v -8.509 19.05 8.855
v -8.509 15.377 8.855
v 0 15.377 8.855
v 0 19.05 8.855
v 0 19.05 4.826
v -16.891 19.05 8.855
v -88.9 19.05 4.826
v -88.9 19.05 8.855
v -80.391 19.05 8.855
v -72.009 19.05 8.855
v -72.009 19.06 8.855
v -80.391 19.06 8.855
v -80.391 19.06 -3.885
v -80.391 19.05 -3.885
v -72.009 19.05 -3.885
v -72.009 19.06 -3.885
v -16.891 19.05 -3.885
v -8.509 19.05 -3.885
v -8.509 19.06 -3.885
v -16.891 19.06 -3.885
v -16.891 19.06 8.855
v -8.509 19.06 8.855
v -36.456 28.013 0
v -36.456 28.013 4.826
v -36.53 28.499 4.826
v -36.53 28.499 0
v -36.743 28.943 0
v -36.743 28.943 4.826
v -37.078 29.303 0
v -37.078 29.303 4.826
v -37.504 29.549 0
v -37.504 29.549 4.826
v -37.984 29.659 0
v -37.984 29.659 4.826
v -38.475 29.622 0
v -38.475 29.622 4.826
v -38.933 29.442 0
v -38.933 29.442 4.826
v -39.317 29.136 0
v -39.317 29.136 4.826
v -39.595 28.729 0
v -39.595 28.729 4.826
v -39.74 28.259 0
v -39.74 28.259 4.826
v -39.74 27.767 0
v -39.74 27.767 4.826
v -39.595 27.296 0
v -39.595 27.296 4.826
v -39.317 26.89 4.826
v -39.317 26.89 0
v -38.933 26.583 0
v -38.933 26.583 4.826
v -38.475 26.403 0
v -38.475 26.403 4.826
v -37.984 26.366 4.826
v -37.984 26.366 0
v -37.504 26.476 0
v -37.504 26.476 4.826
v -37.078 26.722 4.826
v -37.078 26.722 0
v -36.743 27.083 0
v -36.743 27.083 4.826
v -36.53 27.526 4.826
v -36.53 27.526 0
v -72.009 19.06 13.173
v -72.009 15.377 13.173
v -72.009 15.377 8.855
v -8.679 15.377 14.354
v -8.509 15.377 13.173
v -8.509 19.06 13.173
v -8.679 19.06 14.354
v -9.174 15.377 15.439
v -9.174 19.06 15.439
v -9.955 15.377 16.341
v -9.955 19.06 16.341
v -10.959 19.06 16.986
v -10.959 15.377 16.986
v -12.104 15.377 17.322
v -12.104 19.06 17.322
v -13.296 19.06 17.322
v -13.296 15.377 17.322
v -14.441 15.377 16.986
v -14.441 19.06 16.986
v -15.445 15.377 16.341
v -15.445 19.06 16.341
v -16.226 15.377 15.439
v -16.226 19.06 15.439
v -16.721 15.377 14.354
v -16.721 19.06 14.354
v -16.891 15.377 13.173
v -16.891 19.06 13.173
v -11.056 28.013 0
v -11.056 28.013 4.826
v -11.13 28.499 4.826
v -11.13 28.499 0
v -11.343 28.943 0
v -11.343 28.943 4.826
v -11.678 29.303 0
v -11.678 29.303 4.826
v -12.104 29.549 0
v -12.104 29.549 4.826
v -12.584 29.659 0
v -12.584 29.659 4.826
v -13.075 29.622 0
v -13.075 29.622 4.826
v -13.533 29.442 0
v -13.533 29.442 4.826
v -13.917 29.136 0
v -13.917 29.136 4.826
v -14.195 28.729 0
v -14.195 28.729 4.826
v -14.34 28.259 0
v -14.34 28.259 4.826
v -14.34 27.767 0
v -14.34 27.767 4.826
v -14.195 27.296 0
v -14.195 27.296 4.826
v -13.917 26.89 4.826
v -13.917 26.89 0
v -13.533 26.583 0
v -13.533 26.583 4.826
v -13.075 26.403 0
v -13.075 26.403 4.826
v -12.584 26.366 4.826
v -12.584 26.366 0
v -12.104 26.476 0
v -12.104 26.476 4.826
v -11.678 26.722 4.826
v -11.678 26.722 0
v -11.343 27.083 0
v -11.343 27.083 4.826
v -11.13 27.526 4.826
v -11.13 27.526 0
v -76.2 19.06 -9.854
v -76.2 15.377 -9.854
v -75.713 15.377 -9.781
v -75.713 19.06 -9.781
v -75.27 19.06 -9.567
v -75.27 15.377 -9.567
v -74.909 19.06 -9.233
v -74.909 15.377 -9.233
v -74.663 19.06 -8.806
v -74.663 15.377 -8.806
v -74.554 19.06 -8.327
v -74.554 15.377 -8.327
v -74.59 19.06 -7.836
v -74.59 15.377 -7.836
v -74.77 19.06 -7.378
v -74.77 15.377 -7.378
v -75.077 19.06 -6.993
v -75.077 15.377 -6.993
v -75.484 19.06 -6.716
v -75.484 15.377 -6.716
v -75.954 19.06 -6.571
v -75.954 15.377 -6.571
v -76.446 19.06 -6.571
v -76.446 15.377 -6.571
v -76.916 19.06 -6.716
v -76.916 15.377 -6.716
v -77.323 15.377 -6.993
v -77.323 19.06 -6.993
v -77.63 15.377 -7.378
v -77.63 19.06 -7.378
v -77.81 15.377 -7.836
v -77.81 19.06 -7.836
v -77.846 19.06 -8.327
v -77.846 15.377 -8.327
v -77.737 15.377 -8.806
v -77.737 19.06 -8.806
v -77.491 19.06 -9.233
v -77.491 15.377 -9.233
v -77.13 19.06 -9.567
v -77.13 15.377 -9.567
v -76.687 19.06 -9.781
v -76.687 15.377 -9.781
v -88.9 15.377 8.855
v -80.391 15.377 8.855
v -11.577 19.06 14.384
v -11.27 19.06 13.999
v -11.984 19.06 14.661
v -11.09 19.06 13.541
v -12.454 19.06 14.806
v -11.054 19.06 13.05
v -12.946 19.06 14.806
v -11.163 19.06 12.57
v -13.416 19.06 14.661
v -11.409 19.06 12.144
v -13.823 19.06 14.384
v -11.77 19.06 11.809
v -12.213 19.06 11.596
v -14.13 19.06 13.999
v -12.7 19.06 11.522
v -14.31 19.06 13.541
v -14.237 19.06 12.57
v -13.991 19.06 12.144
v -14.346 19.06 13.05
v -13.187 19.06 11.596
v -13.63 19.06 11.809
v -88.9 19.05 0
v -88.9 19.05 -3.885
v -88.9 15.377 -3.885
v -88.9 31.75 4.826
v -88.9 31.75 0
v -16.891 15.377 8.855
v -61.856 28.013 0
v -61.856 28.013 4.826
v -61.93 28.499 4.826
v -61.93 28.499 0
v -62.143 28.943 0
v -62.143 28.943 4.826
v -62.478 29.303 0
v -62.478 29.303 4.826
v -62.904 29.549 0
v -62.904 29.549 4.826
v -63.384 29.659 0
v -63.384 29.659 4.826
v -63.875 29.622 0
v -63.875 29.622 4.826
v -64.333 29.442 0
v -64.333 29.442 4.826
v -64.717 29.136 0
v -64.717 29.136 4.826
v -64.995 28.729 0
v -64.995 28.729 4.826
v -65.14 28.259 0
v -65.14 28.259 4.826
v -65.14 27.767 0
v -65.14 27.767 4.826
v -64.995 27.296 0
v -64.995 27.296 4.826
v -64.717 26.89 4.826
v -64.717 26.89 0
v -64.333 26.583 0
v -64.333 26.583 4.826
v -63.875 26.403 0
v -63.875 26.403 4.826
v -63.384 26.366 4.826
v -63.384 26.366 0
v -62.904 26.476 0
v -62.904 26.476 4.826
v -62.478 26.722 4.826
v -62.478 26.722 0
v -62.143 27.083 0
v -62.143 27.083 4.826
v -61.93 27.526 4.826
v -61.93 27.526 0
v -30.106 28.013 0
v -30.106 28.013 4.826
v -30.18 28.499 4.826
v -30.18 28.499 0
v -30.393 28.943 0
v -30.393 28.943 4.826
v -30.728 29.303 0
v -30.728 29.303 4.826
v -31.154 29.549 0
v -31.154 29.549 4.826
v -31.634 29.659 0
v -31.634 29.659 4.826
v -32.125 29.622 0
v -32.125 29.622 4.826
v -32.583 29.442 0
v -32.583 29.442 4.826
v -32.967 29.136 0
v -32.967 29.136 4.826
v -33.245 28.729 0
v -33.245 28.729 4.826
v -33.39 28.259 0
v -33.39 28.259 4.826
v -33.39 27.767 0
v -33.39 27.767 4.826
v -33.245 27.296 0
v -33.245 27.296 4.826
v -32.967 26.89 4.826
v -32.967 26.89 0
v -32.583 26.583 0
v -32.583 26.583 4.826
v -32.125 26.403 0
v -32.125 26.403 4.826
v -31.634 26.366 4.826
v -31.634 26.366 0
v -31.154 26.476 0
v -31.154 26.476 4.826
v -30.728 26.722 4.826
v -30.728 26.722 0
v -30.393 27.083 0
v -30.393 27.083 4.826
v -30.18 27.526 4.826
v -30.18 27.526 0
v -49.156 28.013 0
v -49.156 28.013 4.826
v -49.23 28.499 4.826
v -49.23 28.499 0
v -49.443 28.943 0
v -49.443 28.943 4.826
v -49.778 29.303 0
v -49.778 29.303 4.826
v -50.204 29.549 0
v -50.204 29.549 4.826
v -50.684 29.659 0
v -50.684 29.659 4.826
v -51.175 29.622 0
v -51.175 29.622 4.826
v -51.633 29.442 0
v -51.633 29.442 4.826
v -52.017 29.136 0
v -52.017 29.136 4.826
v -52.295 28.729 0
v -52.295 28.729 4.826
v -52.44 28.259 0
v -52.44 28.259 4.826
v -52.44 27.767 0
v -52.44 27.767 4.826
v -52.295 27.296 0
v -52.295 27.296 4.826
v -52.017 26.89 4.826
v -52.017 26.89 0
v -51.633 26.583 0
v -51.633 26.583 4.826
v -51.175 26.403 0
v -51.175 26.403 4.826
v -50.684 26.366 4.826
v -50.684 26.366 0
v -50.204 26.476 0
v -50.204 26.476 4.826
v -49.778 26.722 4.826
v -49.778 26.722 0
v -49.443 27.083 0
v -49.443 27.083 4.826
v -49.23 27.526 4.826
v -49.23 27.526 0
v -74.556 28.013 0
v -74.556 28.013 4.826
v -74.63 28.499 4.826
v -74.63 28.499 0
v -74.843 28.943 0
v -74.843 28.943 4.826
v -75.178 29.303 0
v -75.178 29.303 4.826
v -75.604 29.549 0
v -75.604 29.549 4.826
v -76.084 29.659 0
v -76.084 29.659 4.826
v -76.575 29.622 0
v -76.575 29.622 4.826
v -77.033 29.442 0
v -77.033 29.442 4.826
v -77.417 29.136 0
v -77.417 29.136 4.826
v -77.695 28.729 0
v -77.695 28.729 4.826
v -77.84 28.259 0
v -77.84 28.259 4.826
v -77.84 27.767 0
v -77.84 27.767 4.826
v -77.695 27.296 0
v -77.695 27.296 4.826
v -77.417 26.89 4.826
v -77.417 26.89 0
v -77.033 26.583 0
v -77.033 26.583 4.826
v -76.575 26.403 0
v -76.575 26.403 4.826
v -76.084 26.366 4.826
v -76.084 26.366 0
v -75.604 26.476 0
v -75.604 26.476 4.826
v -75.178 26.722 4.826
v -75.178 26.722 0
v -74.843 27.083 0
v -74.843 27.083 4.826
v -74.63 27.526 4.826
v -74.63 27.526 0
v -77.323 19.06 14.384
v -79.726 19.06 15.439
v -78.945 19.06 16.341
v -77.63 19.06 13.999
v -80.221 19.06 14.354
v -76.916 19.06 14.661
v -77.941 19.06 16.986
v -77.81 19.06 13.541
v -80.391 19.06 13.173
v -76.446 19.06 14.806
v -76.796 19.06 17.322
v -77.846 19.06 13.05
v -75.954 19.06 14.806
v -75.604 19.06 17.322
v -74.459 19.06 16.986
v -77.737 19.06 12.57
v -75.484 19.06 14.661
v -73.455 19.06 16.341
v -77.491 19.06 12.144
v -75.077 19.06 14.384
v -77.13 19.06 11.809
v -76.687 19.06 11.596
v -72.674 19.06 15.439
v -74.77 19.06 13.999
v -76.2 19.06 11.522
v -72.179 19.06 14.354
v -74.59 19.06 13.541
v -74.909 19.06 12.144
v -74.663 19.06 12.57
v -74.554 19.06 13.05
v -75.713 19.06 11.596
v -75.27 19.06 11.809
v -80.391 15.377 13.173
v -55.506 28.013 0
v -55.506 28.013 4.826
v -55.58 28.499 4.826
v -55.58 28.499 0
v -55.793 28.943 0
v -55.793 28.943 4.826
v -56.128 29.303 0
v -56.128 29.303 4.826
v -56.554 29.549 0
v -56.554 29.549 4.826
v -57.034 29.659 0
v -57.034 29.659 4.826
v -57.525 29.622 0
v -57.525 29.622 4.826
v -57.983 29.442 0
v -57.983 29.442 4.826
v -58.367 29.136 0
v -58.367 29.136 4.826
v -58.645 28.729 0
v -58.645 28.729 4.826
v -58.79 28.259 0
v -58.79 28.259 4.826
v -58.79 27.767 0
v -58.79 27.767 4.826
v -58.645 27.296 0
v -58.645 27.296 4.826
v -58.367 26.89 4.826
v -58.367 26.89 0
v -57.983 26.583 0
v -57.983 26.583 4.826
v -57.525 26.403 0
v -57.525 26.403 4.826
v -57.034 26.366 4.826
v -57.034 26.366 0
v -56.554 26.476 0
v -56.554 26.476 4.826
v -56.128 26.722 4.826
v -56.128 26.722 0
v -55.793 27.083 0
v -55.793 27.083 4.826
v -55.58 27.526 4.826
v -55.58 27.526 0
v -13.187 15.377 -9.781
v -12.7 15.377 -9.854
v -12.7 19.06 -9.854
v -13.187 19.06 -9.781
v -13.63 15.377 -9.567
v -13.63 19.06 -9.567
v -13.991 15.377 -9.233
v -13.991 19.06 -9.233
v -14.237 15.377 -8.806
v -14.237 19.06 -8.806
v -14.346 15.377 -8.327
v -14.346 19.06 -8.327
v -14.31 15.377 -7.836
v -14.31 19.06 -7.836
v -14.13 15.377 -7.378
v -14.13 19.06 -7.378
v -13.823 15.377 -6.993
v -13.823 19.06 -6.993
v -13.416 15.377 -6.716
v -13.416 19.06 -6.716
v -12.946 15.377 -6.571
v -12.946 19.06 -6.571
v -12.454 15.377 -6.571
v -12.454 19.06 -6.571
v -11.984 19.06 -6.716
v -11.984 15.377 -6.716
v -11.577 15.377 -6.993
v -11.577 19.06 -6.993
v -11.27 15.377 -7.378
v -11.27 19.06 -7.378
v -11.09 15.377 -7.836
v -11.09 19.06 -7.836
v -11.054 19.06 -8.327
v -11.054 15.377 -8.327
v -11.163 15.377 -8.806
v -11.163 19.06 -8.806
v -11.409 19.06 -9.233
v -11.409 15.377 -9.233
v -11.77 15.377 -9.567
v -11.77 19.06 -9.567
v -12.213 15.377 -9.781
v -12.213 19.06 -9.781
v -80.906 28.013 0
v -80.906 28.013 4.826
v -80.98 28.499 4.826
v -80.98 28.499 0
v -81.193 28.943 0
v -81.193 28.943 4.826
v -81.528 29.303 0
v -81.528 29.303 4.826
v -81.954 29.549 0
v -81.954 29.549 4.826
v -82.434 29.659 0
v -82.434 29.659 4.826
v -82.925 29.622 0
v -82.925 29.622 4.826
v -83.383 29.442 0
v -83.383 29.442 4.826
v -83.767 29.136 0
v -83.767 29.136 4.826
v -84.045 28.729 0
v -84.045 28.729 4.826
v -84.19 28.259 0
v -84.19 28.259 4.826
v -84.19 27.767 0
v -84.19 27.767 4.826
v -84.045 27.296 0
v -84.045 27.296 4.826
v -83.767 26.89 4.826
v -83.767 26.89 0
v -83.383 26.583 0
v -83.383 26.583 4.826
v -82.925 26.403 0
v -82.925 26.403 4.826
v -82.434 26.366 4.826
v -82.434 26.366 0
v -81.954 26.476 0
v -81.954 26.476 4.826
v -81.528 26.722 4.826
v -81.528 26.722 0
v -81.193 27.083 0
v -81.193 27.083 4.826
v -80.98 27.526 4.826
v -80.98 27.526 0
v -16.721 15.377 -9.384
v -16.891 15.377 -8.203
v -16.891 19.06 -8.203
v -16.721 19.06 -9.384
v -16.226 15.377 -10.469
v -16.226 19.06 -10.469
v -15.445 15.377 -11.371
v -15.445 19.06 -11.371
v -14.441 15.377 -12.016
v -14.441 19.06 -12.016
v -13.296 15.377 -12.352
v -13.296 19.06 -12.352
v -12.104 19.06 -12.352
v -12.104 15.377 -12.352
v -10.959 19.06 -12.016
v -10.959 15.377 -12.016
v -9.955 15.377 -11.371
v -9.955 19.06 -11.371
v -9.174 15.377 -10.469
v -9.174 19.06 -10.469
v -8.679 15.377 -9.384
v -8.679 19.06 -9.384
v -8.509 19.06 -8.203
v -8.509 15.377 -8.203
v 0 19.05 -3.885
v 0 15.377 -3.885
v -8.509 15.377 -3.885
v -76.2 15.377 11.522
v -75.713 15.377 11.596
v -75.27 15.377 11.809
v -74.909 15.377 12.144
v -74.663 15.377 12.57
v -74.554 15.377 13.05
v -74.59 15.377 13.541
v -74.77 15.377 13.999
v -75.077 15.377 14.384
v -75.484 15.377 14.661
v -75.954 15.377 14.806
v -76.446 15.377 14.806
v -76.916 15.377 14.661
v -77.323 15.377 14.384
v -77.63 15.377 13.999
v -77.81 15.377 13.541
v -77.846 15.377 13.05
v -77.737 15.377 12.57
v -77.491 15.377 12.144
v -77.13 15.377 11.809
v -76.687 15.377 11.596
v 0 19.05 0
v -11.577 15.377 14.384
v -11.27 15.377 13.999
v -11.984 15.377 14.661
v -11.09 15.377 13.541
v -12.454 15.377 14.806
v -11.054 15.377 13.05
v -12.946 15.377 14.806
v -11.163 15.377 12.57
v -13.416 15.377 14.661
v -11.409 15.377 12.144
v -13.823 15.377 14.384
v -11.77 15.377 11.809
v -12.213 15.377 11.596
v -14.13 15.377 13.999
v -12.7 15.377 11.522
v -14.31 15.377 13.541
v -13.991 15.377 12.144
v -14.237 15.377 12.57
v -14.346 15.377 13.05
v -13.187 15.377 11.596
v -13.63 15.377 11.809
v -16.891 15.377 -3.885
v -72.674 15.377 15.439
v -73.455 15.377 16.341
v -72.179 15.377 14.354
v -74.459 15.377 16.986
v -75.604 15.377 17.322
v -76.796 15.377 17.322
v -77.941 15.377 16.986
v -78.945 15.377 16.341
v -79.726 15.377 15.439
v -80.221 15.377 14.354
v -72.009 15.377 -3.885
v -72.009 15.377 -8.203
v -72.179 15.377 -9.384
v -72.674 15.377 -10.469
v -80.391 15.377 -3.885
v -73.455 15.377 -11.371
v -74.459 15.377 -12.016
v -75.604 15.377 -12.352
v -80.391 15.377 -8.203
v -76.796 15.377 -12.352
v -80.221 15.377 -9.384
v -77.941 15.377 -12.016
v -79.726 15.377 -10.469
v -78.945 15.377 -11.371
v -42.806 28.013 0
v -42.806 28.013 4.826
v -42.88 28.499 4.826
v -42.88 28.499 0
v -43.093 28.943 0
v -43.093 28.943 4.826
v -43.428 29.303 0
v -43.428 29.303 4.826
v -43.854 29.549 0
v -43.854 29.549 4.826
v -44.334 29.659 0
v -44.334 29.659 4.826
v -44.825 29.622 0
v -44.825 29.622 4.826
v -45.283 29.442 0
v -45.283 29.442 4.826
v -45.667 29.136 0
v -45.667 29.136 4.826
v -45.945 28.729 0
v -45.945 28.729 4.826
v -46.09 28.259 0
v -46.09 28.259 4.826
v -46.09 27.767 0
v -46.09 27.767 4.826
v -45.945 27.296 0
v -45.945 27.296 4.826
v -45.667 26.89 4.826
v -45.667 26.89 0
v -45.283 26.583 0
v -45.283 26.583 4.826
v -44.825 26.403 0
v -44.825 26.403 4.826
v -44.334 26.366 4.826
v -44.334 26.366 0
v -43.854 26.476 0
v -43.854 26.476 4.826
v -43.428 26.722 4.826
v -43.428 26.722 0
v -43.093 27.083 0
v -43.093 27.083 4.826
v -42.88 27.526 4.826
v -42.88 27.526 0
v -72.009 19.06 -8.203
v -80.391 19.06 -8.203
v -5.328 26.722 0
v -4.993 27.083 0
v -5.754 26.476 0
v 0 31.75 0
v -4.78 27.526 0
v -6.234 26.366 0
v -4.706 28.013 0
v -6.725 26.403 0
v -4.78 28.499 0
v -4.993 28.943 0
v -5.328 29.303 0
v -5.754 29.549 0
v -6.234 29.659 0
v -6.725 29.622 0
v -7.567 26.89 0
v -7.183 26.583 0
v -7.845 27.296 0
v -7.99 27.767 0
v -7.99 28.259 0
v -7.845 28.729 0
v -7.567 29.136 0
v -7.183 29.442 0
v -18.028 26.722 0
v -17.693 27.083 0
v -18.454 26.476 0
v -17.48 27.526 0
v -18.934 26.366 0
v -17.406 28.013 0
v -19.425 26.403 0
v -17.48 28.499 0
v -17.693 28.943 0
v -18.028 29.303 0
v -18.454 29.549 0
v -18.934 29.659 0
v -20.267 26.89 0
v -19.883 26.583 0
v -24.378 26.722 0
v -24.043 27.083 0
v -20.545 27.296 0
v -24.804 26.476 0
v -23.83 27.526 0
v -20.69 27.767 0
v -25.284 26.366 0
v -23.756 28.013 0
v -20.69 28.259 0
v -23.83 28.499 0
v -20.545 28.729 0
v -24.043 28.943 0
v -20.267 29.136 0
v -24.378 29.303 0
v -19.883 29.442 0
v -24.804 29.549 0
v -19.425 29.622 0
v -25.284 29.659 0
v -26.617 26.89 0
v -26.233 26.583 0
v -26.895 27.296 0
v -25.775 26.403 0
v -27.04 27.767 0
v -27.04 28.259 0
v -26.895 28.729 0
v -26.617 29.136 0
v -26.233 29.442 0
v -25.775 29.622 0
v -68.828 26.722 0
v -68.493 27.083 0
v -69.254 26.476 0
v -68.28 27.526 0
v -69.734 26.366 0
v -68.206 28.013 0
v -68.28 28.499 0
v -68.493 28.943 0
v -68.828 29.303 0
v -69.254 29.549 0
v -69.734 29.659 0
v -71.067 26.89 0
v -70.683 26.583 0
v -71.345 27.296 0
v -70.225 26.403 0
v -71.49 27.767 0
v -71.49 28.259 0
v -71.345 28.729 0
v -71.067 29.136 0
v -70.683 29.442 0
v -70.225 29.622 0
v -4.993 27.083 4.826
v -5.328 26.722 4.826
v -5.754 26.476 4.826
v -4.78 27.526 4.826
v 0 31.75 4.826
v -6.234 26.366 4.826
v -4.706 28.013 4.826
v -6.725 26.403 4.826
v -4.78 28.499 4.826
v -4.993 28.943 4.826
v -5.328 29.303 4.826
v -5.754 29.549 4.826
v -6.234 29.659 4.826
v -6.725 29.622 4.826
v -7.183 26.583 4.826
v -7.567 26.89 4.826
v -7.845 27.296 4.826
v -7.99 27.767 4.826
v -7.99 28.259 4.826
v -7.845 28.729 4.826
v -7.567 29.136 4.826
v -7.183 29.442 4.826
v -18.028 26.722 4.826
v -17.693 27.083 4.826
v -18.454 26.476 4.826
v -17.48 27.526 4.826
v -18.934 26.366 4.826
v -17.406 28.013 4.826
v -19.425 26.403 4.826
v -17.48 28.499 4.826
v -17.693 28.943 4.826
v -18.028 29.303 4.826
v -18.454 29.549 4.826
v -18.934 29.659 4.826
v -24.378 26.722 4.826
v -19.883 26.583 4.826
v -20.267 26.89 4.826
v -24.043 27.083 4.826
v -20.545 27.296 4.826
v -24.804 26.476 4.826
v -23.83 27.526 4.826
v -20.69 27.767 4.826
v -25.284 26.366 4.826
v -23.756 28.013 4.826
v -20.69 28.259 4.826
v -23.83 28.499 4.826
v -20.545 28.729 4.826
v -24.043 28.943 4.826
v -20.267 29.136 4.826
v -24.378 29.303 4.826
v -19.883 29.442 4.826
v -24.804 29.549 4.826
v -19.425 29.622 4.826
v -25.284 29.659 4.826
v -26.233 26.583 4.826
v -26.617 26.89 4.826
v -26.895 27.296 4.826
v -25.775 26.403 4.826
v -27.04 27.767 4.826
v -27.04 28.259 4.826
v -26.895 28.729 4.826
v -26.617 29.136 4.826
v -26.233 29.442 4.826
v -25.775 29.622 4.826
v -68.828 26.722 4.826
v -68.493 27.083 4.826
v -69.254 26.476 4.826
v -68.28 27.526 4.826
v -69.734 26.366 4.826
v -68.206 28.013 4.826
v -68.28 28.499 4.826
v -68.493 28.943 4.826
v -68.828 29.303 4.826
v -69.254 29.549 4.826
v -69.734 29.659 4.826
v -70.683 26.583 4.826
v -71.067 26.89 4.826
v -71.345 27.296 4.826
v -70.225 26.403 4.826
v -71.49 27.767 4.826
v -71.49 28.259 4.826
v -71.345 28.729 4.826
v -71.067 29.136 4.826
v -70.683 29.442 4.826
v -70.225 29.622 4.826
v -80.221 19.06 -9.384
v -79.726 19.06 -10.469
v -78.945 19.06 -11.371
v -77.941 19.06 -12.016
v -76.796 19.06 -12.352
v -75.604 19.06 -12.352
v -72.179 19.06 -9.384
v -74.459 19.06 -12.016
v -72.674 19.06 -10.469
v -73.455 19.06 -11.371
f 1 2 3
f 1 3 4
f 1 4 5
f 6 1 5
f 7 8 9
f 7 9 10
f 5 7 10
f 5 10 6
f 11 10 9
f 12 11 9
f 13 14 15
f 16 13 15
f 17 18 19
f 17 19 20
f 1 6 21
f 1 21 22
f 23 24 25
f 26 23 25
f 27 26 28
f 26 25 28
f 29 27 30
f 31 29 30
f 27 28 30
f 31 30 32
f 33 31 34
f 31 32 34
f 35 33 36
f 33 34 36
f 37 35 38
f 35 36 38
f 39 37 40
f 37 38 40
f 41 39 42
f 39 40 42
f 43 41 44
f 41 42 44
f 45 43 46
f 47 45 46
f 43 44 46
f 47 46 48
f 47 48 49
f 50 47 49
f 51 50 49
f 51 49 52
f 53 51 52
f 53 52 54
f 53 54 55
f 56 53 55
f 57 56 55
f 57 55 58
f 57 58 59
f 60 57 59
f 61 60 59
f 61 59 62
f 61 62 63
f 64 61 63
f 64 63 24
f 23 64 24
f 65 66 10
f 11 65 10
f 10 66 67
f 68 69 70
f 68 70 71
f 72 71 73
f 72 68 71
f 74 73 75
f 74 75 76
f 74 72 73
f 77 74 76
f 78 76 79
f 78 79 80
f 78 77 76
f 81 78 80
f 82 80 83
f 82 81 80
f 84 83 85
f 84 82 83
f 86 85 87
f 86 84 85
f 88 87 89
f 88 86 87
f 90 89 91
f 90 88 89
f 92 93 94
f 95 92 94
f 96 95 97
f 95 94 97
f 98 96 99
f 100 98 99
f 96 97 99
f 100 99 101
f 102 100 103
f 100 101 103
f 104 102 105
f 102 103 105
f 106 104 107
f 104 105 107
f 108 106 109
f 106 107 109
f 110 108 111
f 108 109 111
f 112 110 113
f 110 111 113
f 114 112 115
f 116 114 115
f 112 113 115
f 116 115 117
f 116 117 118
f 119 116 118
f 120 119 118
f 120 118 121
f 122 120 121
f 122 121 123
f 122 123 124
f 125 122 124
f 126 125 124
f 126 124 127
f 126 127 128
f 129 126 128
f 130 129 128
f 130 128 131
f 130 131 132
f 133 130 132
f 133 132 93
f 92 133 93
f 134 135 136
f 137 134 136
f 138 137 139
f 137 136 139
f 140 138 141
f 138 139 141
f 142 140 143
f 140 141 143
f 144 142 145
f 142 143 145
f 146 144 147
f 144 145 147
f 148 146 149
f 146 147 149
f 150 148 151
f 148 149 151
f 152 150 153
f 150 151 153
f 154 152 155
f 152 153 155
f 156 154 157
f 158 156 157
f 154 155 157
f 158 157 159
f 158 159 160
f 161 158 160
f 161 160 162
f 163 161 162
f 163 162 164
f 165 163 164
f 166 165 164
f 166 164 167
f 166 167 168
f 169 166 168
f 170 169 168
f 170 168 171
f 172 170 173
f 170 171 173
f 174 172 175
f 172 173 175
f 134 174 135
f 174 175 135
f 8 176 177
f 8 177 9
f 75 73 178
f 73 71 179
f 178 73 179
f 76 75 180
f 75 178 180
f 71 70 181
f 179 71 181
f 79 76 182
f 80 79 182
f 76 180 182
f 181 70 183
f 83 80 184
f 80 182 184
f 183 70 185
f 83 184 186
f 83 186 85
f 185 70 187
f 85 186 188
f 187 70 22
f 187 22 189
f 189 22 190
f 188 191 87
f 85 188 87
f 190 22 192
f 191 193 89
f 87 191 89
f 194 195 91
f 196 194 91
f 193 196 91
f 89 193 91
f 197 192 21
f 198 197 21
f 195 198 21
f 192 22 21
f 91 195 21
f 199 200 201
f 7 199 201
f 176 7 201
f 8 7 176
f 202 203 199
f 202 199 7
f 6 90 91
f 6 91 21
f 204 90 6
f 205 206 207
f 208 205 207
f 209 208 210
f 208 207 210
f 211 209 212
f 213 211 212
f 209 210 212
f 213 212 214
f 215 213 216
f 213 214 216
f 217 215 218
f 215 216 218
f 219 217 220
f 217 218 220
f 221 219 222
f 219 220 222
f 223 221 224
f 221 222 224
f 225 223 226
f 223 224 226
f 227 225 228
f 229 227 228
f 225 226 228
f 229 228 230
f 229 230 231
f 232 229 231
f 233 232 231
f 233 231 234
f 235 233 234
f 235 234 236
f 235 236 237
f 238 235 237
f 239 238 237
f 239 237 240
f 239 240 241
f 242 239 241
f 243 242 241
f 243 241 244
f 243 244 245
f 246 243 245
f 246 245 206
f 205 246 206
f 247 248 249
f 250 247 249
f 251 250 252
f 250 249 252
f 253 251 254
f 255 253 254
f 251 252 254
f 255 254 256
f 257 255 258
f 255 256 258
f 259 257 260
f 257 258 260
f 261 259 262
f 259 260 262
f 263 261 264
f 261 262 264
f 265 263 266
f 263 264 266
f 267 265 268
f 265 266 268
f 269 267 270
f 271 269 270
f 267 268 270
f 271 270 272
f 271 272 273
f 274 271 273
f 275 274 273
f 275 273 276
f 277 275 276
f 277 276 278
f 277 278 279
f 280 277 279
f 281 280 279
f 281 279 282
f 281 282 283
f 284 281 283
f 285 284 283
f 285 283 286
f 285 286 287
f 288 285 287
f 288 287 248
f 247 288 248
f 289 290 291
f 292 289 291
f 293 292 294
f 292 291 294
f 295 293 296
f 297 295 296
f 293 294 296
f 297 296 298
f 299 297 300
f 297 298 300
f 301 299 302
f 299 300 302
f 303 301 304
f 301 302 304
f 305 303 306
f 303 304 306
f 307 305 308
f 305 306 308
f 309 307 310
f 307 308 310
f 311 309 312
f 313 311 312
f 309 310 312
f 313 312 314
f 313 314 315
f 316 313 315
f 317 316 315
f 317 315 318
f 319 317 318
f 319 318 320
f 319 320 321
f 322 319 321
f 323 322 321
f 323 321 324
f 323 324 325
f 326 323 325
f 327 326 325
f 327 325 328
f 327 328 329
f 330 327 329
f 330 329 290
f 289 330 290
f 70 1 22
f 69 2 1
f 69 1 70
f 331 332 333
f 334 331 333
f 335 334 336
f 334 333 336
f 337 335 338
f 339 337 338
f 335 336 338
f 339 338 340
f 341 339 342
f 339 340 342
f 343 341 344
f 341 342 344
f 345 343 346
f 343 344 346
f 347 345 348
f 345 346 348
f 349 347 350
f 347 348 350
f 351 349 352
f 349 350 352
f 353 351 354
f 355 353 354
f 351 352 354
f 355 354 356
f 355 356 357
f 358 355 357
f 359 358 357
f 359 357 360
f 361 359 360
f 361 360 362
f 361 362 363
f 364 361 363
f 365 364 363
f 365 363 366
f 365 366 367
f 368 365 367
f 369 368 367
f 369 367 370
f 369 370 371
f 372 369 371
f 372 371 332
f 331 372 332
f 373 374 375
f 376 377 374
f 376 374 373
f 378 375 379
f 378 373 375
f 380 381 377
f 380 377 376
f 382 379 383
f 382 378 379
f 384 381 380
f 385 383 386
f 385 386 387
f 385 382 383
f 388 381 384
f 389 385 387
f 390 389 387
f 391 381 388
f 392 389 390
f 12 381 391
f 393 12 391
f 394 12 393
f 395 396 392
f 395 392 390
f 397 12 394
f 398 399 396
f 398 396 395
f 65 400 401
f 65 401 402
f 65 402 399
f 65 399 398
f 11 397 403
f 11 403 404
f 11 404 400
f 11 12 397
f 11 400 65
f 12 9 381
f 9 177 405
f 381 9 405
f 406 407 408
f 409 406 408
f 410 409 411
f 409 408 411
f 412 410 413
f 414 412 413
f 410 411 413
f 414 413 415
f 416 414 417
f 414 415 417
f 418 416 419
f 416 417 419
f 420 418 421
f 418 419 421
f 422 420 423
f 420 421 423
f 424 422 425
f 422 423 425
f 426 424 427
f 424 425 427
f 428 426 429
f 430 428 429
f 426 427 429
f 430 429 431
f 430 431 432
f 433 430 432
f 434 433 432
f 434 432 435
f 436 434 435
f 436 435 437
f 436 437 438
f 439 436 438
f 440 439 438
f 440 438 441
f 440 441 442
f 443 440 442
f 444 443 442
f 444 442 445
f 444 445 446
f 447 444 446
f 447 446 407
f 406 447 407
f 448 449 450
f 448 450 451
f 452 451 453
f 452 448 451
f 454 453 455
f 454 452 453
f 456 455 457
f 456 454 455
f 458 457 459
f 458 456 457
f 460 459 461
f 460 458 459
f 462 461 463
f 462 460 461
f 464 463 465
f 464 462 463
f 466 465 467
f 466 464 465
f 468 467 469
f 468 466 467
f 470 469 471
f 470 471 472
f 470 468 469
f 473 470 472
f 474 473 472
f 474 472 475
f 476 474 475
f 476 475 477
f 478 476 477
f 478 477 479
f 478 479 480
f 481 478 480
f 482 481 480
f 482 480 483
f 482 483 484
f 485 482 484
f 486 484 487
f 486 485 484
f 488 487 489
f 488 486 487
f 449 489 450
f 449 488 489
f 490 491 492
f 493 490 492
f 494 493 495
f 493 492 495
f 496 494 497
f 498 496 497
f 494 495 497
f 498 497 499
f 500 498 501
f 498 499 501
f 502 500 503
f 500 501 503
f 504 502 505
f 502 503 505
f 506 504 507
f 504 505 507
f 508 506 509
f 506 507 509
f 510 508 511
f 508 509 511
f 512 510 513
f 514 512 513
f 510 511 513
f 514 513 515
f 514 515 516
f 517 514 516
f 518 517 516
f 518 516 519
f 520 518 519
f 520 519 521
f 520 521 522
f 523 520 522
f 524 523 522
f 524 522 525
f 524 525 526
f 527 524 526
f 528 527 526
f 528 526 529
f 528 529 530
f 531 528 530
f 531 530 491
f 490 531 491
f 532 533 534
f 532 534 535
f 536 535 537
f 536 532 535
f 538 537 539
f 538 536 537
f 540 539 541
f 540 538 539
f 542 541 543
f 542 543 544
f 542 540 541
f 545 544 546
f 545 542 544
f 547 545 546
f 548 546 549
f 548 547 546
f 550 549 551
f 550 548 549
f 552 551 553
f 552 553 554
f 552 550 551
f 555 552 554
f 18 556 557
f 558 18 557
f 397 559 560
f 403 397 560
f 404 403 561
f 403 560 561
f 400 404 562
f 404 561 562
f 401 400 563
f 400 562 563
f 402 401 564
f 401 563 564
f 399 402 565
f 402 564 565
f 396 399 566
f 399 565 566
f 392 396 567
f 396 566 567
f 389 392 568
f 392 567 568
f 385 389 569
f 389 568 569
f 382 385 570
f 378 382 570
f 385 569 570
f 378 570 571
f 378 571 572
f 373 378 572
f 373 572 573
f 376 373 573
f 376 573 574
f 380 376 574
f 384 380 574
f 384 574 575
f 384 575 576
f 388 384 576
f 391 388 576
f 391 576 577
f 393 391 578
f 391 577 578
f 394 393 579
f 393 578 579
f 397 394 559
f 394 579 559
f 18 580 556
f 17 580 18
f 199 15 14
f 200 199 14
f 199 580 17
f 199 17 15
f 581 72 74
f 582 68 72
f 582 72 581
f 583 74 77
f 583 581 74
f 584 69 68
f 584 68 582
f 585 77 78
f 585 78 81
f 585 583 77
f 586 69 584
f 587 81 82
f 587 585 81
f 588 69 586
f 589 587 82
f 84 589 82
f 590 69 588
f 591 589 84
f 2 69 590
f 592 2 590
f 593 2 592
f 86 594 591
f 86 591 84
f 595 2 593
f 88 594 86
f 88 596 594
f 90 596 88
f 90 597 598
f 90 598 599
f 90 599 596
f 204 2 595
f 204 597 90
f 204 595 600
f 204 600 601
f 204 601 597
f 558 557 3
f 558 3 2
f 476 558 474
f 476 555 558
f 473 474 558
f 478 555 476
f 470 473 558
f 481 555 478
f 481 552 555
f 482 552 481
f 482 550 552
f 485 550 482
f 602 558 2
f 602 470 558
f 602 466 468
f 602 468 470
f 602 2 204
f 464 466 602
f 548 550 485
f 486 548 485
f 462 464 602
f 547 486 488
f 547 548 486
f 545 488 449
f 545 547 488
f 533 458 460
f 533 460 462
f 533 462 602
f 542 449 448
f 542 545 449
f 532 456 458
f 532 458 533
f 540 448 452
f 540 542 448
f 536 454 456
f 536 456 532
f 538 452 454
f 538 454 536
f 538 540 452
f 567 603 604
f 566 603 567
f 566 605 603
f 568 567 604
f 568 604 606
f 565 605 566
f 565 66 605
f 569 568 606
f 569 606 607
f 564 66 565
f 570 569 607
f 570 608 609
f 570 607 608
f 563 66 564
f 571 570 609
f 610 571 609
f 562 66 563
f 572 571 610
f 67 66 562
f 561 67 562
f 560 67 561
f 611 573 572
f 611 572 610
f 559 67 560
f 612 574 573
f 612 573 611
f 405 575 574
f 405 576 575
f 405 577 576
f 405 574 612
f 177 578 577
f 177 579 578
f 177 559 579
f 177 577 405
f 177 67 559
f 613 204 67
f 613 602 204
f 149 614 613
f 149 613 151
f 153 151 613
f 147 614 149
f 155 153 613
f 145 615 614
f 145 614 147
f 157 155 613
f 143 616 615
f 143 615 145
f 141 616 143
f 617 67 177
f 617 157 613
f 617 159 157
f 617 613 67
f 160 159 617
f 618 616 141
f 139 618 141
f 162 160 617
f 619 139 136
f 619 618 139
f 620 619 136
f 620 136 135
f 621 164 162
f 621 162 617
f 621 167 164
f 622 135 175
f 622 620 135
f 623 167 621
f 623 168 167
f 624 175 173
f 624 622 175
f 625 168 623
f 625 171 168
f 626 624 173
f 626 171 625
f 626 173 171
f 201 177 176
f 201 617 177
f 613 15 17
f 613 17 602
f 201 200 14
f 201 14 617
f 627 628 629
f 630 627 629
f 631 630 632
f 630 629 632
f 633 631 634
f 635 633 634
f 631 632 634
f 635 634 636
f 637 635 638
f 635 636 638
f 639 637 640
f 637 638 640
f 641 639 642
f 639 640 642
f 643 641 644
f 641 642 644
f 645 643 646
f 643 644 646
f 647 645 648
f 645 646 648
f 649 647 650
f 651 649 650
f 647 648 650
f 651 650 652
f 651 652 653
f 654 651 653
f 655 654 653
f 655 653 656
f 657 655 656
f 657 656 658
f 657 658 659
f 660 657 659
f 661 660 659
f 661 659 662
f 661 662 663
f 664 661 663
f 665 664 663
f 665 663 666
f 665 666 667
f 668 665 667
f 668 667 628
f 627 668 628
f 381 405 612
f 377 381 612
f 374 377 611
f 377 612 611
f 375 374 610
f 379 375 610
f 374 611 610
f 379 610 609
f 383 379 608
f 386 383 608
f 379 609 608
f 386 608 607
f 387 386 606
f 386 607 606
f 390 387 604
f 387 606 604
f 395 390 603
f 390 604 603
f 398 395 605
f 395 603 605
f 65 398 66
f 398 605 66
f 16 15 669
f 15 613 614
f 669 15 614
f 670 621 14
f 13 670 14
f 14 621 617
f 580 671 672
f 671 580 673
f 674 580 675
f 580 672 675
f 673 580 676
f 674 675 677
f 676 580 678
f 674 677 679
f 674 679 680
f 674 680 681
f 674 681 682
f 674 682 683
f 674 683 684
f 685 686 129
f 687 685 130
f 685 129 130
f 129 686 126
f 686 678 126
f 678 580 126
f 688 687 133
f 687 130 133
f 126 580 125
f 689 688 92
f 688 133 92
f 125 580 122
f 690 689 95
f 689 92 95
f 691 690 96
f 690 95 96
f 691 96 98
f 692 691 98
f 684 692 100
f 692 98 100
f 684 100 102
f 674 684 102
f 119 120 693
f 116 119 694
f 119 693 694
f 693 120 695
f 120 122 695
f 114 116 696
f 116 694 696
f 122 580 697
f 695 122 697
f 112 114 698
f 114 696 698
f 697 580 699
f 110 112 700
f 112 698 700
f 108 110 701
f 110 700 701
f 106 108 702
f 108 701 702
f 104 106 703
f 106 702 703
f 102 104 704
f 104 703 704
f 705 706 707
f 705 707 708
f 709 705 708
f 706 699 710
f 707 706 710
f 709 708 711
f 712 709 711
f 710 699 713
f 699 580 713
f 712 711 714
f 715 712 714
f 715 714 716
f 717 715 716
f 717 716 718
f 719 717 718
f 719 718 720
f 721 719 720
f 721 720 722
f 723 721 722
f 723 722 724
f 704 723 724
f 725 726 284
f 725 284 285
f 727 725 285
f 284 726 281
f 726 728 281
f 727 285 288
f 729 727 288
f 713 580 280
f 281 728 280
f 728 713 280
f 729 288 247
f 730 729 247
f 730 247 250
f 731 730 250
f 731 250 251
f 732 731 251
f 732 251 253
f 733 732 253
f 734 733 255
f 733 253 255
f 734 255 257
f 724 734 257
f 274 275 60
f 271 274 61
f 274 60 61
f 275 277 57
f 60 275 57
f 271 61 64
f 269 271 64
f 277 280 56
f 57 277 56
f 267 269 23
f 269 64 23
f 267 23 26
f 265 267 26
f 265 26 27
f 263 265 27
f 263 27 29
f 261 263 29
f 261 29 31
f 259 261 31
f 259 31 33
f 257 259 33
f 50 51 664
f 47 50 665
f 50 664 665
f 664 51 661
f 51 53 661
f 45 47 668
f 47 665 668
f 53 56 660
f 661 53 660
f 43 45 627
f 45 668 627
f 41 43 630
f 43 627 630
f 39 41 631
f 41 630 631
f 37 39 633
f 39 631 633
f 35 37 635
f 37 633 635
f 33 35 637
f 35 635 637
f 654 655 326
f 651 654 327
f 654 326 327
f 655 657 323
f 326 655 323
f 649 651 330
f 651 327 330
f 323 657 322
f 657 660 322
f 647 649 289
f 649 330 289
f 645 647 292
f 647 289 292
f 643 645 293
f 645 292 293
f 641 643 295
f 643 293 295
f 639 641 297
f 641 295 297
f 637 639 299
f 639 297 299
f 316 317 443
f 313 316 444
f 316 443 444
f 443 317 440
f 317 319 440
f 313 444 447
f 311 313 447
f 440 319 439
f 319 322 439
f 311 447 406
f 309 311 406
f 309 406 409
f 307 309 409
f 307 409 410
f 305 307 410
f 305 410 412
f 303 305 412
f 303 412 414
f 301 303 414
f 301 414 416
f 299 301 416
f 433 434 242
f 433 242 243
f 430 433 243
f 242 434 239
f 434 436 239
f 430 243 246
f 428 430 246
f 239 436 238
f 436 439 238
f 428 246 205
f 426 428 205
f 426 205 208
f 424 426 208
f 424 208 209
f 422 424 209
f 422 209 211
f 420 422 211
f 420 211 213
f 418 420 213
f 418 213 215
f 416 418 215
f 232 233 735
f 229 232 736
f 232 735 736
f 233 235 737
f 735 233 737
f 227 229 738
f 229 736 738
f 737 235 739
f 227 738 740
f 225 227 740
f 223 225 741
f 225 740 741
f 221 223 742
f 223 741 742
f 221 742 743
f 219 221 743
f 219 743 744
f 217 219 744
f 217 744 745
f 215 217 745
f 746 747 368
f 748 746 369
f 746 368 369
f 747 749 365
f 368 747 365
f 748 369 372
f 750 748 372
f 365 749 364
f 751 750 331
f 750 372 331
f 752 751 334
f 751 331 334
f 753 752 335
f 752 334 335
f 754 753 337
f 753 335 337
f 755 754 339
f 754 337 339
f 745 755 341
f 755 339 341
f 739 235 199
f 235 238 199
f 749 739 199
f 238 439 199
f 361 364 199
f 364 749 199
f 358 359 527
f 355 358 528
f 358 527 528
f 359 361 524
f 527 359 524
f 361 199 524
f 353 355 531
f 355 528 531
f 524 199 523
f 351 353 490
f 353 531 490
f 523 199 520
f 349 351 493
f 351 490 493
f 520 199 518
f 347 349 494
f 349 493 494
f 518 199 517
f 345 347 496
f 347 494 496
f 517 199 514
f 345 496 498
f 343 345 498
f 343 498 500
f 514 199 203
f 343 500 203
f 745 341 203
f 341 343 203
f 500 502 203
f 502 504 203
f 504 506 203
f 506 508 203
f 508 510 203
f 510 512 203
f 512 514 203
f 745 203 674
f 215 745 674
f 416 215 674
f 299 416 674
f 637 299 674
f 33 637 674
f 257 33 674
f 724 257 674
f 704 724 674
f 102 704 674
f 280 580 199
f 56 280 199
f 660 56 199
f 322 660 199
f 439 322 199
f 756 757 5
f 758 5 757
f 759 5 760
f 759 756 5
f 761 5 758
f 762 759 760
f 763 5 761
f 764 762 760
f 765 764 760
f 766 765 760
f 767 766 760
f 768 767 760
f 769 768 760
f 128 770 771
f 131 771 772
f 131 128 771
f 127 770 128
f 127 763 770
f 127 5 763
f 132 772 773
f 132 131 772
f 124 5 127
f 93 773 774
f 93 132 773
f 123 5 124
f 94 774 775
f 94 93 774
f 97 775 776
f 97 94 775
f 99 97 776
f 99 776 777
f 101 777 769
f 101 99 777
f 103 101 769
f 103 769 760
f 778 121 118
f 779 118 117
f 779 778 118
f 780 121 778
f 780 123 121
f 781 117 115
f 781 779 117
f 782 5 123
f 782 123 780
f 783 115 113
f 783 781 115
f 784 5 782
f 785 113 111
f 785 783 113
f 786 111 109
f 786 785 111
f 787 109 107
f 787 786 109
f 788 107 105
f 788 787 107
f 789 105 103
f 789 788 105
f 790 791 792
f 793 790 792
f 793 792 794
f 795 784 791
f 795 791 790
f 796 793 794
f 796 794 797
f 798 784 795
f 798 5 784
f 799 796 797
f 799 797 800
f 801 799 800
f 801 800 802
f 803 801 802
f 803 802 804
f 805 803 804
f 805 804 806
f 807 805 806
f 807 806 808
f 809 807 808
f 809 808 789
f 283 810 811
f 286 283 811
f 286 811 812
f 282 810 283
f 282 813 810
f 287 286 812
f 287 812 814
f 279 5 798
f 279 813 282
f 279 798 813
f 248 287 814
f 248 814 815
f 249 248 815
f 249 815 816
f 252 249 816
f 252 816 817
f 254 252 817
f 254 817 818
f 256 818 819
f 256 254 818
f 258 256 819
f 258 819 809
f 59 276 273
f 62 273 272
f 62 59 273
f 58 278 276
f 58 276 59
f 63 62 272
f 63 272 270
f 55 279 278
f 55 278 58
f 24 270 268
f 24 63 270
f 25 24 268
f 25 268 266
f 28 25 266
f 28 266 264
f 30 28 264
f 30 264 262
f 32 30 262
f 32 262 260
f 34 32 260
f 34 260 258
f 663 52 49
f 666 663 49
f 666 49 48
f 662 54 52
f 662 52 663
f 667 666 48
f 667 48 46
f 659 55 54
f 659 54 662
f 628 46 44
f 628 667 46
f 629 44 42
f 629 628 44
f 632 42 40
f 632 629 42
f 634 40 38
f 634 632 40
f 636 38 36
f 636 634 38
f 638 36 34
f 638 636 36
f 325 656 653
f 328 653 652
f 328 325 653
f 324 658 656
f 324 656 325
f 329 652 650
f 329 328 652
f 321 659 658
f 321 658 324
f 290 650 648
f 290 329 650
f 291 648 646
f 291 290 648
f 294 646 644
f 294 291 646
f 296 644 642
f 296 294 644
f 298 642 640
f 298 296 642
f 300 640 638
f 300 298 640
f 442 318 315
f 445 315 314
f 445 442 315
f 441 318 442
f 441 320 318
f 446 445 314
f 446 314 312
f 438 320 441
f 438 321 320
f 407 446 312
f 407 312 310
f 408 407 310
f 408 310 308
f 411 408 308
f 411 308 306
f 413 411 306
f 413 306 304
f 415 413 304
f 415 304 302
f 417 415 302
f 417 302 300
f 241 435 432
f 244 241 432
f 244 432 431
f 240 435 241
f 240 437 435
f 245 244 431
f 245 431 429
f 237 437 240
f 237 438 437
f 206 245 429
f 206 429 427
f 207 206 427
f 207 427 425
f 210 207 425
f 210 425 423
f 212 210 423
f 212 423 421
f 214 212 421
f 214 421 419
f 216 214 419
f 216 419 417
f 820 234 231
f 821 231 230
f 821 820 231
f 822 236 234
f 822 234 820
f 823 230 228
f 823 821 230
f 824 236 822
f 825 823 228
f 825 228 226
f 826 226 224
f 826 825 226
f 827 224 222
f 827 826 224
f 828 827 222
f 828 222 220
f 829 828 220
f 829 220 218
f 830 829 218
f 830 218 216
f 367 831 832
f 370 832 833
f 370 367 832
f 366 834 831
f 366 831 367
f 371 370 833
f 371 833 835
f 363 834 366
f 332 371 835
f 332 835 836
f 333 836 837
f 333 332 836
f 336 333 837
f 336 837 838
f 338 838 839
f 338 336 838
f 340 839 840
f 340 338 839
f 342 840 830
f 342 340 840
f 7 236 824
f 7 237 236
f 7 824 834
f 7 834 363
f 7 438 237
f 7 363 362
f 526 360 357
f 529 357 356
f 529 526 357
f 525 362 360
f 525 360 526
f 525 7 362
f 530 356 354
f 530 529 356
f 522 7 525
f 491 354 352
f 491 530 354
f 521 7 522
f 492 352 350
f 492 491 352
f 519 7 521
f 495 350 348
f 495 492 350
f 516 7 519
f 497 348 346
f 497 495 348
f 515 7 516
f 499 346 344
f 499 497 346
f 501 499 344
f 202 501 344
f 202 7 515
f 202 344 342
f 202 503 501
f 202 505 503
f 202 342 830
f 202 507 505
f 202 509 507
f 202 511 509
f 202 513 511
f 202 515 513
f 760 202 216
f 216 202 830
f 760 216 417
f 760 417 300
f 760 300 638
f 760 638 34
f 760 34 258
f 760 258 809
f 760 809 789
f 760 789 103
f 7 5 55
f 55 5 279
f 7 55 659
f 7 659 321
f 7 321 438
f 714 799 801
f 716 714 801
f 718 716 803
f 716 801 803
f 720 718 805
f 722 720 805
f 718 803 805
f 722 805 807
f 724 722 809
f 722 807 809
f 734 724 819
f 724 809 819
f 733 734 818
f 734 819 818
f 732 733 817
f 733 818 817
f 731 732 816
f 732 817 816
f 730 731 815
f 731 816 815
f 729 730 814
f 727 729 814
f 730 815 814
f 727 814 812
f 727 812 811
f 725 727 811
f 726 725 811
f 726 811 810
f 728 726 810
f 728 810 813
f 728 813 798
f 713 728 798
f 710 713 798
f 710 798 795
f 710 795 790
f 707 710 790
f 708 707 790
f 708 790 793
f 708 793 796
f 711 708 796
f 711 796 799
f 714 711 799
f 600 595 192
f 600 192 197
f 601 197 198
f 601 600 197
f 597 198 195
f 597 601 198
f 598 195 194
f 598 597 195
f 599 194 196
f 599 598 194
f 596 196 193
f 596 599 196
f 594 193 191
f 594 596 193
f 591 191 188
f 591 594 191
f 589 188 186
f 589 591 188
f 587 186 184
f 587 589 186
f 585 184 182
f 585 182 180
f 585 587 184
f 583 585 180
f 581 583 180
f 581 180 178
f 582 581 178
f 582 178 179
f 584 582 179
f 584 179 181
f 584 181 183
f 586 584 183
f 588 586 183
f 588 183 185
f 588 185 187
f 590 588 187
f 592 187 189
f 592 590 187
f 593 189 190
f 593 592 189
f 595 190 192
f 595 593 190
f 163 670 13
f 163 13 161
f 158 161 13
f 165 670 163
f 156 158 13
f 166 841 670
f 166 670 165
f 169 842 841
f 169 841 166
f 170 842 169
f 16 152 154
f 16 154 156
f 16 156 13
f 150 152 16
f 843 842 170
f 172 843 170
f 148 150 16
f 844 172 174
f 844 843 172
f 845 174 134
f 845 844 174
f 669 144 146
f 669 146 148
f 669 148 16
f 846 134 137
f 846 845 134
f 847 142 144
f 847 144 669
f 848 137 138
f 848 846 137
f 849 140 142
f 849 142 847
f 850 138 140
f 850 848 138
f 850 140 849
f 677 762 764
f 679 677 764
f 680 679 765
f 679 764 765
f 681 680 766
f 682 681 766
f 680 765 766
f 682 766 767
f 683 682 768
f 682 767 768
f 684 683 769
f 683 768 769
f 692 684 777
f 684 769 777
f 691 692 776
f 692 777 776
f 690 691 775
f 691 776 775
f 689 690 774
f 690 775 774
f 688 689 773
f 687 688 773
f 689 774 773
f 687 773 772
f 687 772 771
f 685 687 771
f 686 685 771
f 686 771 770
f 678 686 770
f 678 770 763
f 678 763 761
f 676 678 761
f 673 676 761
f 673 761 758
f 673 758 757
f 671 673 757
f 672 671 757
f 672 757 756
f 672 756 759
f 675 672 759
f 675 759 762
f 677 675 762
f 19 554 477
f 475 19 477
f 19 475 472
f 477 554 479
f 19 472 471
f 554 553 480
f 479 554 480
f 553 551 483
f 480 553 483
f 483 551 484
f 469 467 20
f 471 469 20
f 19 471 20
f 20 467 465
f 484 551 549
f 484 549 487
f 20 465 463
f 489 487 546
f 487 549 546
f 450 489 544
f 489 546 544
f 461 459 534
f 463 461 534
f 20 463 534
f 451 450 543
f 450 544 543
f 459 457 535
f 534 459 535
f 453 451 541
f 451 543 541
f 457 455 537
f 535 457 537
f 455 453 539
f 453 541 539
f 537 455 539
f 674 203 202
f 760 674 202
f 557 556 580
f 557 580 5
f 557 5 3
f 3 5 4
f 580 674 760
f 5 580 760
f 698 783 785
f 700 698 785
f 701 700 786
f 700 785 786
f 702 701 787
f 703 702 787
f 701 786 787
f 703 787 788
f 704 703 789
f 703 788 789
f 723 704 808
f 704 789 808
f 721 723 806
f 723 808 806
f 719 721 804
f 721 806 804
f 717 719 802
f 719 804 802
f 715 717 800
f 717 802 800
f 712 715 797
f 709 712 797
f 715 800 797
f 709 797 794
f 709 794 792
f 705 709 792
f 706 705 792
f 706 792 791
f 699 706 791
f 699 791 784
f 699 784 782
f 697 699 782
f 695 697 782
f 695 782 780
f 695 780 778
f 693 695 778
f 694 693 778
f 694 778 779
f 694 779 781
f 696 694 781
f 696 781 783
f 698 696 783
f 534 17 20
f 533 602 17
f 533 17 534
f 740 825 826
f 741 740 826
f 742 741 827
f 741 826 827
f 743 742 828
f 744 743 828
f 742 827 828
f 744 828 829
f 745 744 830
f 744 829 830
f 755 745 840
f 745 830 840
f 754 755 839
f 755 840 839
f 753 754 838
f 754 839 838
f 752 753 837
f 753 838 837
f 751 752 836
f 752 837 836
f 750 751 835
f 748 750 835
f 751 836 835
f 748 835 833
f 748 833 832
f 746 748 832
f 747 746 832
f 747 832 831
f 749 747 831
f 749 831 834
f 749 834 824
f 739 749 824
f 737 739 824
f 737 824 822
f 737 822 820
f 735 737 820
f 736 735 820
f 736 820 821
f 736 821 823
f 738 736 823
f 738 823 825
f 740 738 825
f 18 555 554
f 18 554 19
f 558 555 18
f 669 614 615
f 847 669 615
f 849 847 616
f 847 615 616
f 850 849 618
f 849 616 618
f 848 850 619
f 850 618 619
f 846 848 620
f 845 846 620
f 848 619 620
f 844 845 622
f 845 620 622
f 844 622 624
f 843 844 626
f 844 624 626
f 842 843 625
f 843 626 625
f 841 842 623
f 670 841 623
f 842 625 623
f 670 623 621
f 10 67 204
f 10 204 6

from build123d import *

# Parameters (mm, degrees)
SKETCH1_W           = 88.9
SKETCH1_H           = 25.4
BOSS_EXTRUDE1_DEPTH = 4.826
SKETCH3_W           = 88.9
SKETCH3_H           = 12.7
CUT_EXTRUDE2_DEPTH  = 93.583261317
BOSS_EXTRUDE2_DEPTH = 88.9
SKETCH7_W           = 88.9
SKETCH7_H           = 2.676927262
CUT_EXTRUDE3_DEPTH  = 94.331081232
SKETCH9_W           = 4.826
SKETCH9_H           = 6.35
BOSS_EXTRUDE3_DEPTH = 88.9
SKETCH11_R          = 1.651
CUT_EXTRUDE4_DEPTH  = 95.800625252
SKETCH13_R          = 1.651
BOSS_EXTRUDE4_DEPTH = 3.683


with BuildPart() as part:
    # Sketch1 → Boss-Extrude1 (new body)
    with BuildSketch(Plane.XY):
        with Locations((-44.45, 12.7)):
            Rectangle(SKETCH1_W, SKETCH1_H)
    extrude(amount=BOSS_EXTRUDE1_DEPTH)

    # Sketch3 → Cut-Extrude2 (cut, through all)
    with BuildSketch(Plane.XY.offset(4.826)):
        with Locations((-44.45, 6.35)):
            Rectangle(SKETCH3_W, SKETCH3_H)
    extrude(amount=-CUT_EXTRUDE2_DEPTH, mode=Mode.SUBTRACT)

    # Sketch6 → Boss-Extrude2 (add)
    with BuildSketch(Plane.ZY.offset(88.9)):
        Polygon((2.413, 12.7), (8.855255209, 12.7), (8.855255209, 19.05), (-3.885259846, 19.05), (-3.885259846, 12.7), align=None)
    extrude(amount=-BOSS_EXTRUDE2_DEPTH)

    # Sketch7 → Cut-Extrude3 (cut, through all)
    with BuildSketch(Plane.XY.offset(8.855255209)):
        with Locations((-44.45, 14.038463631)):
            Rectangle(SKETCH7_W, SKETCH7_H)
    extrude(amount=-CUT_EXTRUDE3_DEPTH, mode=Mode.SUBTRACT)

    # Sketch9 → Boss-Extrude3 (add)
    with BuildSketch(Plane.ZY.offset(88.9)):
        with Locations((2.413, 28.575)):
            Rectangle(SKETCH9_W, SKETCH9_H)
    extrude(amount=-BOSS_EXTRUDE3_DEPTH)

    # Sketch11 → Cut-Extrude4 (cut, through all)
    with BuildSketch(Plane.XY.offset(4.826)):
        with Locations((-82.557217843, 28.012581488)):
            Circle(SKETCH11_R)
        with Locations((-76.207217843, 28.012581488)):
            Circle(SKETCH11_R)
        with Locations((-69.857217843, 28.012581488)):
            Circle(SKETCH11_R)
        with Locations((-63.507217843, 28.012581488)):
            Circle(SKETCH11_R)
        with Locations((-57.157217843, 28.012581488)):
            Circle(SKETCH11_R)
        with Locations((-50.807217843, 28.012581488)):
            Circle(SKETCH11_R)
        with Locations((-44.457217843, 28.012581488)):
            Circle(SKETCH11_R)
        with Locations((-38.107217843, 28.012581488)):
            Circle(SKETCH11_R)
        with Locations((-31.757217843, 28.012581488)):
            Circle(SKETCH11_R)
        with Locations((-25.407217843, 28.012581488)):
            Circle(SKETCH11_R)
        with Locations((-19.057217843, 28.012581488)):
            Circle(SKETCH11_R)
        with Locations((-12.707217843, 28.012581488)):
            Circle(SKETCH11_R)
        with Locations((-6.357217843, 28.012581488)):
            Circle(SKETCH11_R)
    extrude(amount=-CUT_EXTRUDE4_DEPTH, mode=Mode.SUBTRACT)

    # Sketch13 → Boss-Extrude4 (add)
    # profile 1 of 2: a face of its own
    with BuildSketch(Plane(origin=(0, 15.376927262, 0), x_dir=(-1, 0, 0), z_dir=(0, -1, 0))):
        with BuildLine():
            Line((80.391, -8.855255209), (80.391, -13.173255209))
            ThreePointArc((80.391, -13.173255209), (76.2, -17.364255209), (72.009, -13.173255209))
            Line((72.009, -13.173255209), (72.009, -8.855255209))
            Line((72.009, -8.855255209), (80.391, -8.855255209))
        make_face()
        with Locations(Location((76.2, -13.173255209, 0), (0, 0, 90))):
            Circle(SKETCH13_R, mode=Mode.SUBTRACT)
    # profile 2 of 2: a face of its own
    with BuildSketch(Plane(origin=(0, 15.376927262, 0), x_dir=(-1, 0, 0), z_dir=(0, -1, 0))):
        with BuildLine():
            Line((72.009, 3.885259846), (72.009, 8.203259846))
            ThreePointArc((72.009, 8.203259846), (76.2, 12.394259846), (80.391, 8.203259846))
            Line((80.391, 8.203259846), (80.391, 3.885259846))
            Line((80.391, 3.885259846), (72.009, 3.885259846))
        make_face()
        with Locations(Location((76.2, 8.203259846, 0), (0, 0, 90))):
            Circle(SKETCH13_R, mode=Mode.SUBTRACT)
    boss_extrude4 = extrude(amount=-BOSS_EXTRUDE4_DEPTH)

    # Mirror2: Boss-Extrude4 across plane
    add(boss_extrude4.mirror(Plane(origin=(-44.45, 0, 0), x_dir=(0, 0, 1), z_dir=(1, 0, 0))))


solid = part.part
